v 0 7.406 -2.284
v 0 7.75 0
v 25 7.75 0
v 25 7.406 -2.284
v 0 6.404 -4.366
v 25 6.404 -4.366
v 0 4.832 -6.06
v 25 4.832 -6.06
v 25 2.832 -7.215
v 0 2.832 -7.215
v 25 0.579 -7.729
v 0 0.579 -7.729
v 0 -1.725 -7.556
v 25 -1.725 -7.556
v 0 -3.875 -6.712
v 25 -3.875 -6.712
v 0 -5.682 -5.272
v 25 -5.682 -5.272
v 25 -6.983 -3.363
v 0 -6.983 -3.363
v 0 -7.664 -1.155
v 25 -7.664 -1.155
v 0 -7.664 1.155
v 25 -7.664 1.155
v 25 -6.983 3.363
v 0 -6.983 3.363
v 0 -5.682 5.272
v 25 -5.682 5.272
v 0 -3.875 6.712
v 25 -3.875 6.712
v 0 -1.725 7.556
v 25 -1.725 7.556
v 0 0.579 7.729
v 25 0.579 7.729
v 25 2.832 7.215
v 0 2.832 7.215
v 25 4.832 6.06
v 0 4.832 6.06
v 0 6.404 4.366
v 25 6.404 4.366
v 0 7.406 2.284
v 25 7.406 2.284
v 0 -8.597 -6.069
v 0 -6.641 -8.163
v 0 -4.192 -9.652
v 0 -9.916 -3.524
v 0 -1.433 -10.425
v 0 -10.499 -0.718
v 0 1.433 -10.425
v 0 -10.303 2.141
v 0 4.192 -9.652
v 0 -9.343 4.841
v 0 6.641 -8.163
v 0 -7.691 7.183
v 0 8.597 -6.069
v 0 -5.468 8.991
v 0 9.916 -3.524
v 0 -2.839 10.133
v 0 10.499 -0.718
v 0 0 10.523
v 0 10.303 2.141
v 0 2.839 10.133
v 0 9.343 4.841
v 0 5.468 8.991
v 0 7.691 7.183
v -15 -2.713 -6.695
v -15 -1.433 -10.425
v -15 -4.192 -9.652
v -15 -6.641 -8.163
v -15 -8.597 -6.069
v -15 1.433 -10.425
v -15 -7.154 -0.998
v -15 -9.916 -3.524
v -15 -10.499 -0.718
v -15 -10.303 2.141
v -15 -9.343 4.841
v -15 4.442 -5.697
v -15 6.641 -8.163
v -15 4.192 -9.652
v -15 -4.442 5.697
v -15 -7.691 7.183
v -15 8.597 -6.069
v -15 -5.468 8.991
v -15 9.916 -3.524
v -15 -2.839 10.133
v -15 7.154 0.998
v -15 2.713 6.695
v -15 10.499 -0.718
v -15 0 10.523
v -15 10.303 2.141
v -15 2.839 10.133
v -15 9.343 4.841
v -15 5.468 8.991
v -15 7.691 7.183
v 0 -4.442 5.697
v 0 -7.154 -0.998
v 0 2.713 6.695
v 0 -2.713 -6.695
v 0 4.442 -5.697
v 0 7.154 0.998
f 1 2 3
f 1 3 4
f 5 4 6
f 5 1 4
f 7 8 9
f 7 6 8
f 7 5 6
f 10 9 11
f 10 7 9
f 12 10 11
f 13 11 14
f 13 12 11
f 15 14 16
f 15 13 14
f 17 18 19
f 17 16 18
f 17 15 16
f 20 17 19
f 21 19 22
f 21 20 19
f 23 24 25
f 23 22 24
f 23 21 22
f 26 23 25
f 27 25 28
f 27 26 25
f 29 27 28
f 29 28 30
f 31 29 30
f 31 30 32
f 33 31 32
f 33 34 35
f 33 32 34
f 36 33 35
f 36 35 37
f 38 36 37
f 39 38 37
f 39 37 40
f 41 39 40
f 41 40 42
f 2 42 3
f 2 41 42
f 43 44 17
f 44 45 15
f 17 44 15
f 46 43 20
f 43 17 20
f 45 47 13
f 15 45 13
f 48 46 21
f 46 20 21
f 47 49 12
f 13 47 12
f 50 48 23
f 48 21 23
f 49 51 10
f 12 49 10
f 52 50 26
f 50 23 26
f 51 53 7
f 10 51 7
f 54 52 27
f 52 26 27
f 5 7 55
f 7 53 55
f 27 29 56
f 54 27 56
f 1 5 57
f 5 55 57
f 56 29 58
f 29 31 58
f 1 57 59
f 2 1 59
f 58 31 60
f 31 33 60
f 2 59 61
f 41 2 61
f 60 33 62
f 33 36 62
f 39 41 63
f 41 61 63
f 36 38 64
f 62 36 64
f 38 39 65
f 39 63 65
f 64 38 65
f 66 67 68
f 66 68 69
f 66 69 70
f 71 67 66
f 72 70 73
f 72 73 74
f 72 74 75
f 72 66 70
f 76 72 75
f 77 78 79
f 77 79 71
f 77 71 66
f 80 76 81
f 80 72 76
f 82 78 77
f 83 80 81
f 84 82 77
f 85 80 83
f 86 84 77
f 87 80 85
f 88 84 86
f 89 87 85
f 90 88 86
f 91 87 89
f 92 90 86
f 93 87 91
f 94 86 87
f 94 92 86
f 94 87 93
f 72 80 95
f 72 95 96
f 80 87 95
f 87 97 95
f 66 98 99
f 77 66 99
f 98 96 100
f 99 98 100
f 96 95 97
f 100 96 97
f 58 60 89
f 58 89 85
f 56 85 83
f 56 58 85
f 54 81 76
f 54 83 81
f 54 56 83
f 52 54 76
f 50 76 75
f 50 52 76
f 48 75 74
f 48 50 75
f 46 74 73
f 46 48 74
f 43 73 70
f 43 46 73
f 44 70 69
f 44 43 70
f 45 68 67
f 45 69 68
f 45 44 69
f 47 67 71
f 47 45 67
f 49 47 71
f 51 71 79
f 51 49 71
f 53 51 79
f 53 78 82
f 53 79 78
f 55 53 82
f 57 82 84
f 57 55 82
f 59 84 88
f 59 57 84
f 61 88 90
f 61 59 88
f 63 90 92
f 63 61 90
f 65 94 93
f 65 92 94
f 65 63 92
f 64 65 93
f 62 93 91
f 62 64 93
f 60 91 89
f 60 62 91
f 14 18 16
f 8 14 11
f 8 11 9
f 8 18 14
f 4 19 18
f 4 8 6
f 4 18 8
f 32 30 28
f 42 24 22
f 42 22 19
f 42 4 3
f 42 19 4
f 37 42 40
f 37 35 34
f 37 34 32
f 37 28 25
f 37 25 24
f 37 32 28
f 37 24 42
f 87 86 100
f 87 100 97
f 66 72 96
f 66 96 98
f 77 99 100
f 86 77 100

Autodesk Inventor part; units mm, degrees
ref_plane "YZ Plane" through (0, 0, 0) normal (1, 0, 0) x (0, 1, 0)
ref_plane "XZ Plane" through (0, 0, 0) normal (0, 1, 0) x (-1, 0, 0)
ref_plane "XY Plane" through (0, 0, 0) normal (0, 0, 1) x (1, 0, 0)
sketch "Sketch1" plane through (0, 0, 0) normal (1, 0, 0) x (0, 1, 0)
  circle A0 centre (0, 0) radius 7.7505
extrude "Extrusion1" add sketch "Sketch1" along normal blind 25
thread "Thread1" size "M10x1" class "6g" standard "ANSI Metric M Profile" full length
sketch "Sketch2" plane through (0, 0, 0) normal (-1, 0, 0) x (0, 0, 1)
  point P0 (0, 0)
sketch "Sketch3" plane through (0, 0, 0) normal (-1, 0, 0) x (0, 0, 1)
  circle A0 centre (0, 0) radius 10.5233
  line L0 (5.6968, -4.4416) -> (-0.9981, -7.1543)
  line L1 (-0.9981, -7.1543) -> (-6.6949, -2.7128)
  line L2 (-6.6949, -2.7128) -> (-5.6968, 4.4416)
  line L3 (-5.6968, 4.4416) -> (0.9981, 7.1543)
  line L4 (0.9981, 7.1543) -> (6.6949, 2.7128)
  line L5 (6.6949, 2.7128) -> (5.6968, -4.4416)
extrude "Extrusion2" add sketch "Sketch3" along normal blind 15
sketch "Sketch4" plane through (0, 0, 0) normal (-1, 0, 0) x (0, 0, 1)
  point P0 (0, 0)
sketch "Sketch5" plane through (0, 0, 0) normal (-1, 0, 0) x (0, 0, 1)
  point P0 (0, 0)
thread "Thread2" size "M10x1" class "6g" standard "ANSI Metric M Profile" full length
properties part number "nuts"
